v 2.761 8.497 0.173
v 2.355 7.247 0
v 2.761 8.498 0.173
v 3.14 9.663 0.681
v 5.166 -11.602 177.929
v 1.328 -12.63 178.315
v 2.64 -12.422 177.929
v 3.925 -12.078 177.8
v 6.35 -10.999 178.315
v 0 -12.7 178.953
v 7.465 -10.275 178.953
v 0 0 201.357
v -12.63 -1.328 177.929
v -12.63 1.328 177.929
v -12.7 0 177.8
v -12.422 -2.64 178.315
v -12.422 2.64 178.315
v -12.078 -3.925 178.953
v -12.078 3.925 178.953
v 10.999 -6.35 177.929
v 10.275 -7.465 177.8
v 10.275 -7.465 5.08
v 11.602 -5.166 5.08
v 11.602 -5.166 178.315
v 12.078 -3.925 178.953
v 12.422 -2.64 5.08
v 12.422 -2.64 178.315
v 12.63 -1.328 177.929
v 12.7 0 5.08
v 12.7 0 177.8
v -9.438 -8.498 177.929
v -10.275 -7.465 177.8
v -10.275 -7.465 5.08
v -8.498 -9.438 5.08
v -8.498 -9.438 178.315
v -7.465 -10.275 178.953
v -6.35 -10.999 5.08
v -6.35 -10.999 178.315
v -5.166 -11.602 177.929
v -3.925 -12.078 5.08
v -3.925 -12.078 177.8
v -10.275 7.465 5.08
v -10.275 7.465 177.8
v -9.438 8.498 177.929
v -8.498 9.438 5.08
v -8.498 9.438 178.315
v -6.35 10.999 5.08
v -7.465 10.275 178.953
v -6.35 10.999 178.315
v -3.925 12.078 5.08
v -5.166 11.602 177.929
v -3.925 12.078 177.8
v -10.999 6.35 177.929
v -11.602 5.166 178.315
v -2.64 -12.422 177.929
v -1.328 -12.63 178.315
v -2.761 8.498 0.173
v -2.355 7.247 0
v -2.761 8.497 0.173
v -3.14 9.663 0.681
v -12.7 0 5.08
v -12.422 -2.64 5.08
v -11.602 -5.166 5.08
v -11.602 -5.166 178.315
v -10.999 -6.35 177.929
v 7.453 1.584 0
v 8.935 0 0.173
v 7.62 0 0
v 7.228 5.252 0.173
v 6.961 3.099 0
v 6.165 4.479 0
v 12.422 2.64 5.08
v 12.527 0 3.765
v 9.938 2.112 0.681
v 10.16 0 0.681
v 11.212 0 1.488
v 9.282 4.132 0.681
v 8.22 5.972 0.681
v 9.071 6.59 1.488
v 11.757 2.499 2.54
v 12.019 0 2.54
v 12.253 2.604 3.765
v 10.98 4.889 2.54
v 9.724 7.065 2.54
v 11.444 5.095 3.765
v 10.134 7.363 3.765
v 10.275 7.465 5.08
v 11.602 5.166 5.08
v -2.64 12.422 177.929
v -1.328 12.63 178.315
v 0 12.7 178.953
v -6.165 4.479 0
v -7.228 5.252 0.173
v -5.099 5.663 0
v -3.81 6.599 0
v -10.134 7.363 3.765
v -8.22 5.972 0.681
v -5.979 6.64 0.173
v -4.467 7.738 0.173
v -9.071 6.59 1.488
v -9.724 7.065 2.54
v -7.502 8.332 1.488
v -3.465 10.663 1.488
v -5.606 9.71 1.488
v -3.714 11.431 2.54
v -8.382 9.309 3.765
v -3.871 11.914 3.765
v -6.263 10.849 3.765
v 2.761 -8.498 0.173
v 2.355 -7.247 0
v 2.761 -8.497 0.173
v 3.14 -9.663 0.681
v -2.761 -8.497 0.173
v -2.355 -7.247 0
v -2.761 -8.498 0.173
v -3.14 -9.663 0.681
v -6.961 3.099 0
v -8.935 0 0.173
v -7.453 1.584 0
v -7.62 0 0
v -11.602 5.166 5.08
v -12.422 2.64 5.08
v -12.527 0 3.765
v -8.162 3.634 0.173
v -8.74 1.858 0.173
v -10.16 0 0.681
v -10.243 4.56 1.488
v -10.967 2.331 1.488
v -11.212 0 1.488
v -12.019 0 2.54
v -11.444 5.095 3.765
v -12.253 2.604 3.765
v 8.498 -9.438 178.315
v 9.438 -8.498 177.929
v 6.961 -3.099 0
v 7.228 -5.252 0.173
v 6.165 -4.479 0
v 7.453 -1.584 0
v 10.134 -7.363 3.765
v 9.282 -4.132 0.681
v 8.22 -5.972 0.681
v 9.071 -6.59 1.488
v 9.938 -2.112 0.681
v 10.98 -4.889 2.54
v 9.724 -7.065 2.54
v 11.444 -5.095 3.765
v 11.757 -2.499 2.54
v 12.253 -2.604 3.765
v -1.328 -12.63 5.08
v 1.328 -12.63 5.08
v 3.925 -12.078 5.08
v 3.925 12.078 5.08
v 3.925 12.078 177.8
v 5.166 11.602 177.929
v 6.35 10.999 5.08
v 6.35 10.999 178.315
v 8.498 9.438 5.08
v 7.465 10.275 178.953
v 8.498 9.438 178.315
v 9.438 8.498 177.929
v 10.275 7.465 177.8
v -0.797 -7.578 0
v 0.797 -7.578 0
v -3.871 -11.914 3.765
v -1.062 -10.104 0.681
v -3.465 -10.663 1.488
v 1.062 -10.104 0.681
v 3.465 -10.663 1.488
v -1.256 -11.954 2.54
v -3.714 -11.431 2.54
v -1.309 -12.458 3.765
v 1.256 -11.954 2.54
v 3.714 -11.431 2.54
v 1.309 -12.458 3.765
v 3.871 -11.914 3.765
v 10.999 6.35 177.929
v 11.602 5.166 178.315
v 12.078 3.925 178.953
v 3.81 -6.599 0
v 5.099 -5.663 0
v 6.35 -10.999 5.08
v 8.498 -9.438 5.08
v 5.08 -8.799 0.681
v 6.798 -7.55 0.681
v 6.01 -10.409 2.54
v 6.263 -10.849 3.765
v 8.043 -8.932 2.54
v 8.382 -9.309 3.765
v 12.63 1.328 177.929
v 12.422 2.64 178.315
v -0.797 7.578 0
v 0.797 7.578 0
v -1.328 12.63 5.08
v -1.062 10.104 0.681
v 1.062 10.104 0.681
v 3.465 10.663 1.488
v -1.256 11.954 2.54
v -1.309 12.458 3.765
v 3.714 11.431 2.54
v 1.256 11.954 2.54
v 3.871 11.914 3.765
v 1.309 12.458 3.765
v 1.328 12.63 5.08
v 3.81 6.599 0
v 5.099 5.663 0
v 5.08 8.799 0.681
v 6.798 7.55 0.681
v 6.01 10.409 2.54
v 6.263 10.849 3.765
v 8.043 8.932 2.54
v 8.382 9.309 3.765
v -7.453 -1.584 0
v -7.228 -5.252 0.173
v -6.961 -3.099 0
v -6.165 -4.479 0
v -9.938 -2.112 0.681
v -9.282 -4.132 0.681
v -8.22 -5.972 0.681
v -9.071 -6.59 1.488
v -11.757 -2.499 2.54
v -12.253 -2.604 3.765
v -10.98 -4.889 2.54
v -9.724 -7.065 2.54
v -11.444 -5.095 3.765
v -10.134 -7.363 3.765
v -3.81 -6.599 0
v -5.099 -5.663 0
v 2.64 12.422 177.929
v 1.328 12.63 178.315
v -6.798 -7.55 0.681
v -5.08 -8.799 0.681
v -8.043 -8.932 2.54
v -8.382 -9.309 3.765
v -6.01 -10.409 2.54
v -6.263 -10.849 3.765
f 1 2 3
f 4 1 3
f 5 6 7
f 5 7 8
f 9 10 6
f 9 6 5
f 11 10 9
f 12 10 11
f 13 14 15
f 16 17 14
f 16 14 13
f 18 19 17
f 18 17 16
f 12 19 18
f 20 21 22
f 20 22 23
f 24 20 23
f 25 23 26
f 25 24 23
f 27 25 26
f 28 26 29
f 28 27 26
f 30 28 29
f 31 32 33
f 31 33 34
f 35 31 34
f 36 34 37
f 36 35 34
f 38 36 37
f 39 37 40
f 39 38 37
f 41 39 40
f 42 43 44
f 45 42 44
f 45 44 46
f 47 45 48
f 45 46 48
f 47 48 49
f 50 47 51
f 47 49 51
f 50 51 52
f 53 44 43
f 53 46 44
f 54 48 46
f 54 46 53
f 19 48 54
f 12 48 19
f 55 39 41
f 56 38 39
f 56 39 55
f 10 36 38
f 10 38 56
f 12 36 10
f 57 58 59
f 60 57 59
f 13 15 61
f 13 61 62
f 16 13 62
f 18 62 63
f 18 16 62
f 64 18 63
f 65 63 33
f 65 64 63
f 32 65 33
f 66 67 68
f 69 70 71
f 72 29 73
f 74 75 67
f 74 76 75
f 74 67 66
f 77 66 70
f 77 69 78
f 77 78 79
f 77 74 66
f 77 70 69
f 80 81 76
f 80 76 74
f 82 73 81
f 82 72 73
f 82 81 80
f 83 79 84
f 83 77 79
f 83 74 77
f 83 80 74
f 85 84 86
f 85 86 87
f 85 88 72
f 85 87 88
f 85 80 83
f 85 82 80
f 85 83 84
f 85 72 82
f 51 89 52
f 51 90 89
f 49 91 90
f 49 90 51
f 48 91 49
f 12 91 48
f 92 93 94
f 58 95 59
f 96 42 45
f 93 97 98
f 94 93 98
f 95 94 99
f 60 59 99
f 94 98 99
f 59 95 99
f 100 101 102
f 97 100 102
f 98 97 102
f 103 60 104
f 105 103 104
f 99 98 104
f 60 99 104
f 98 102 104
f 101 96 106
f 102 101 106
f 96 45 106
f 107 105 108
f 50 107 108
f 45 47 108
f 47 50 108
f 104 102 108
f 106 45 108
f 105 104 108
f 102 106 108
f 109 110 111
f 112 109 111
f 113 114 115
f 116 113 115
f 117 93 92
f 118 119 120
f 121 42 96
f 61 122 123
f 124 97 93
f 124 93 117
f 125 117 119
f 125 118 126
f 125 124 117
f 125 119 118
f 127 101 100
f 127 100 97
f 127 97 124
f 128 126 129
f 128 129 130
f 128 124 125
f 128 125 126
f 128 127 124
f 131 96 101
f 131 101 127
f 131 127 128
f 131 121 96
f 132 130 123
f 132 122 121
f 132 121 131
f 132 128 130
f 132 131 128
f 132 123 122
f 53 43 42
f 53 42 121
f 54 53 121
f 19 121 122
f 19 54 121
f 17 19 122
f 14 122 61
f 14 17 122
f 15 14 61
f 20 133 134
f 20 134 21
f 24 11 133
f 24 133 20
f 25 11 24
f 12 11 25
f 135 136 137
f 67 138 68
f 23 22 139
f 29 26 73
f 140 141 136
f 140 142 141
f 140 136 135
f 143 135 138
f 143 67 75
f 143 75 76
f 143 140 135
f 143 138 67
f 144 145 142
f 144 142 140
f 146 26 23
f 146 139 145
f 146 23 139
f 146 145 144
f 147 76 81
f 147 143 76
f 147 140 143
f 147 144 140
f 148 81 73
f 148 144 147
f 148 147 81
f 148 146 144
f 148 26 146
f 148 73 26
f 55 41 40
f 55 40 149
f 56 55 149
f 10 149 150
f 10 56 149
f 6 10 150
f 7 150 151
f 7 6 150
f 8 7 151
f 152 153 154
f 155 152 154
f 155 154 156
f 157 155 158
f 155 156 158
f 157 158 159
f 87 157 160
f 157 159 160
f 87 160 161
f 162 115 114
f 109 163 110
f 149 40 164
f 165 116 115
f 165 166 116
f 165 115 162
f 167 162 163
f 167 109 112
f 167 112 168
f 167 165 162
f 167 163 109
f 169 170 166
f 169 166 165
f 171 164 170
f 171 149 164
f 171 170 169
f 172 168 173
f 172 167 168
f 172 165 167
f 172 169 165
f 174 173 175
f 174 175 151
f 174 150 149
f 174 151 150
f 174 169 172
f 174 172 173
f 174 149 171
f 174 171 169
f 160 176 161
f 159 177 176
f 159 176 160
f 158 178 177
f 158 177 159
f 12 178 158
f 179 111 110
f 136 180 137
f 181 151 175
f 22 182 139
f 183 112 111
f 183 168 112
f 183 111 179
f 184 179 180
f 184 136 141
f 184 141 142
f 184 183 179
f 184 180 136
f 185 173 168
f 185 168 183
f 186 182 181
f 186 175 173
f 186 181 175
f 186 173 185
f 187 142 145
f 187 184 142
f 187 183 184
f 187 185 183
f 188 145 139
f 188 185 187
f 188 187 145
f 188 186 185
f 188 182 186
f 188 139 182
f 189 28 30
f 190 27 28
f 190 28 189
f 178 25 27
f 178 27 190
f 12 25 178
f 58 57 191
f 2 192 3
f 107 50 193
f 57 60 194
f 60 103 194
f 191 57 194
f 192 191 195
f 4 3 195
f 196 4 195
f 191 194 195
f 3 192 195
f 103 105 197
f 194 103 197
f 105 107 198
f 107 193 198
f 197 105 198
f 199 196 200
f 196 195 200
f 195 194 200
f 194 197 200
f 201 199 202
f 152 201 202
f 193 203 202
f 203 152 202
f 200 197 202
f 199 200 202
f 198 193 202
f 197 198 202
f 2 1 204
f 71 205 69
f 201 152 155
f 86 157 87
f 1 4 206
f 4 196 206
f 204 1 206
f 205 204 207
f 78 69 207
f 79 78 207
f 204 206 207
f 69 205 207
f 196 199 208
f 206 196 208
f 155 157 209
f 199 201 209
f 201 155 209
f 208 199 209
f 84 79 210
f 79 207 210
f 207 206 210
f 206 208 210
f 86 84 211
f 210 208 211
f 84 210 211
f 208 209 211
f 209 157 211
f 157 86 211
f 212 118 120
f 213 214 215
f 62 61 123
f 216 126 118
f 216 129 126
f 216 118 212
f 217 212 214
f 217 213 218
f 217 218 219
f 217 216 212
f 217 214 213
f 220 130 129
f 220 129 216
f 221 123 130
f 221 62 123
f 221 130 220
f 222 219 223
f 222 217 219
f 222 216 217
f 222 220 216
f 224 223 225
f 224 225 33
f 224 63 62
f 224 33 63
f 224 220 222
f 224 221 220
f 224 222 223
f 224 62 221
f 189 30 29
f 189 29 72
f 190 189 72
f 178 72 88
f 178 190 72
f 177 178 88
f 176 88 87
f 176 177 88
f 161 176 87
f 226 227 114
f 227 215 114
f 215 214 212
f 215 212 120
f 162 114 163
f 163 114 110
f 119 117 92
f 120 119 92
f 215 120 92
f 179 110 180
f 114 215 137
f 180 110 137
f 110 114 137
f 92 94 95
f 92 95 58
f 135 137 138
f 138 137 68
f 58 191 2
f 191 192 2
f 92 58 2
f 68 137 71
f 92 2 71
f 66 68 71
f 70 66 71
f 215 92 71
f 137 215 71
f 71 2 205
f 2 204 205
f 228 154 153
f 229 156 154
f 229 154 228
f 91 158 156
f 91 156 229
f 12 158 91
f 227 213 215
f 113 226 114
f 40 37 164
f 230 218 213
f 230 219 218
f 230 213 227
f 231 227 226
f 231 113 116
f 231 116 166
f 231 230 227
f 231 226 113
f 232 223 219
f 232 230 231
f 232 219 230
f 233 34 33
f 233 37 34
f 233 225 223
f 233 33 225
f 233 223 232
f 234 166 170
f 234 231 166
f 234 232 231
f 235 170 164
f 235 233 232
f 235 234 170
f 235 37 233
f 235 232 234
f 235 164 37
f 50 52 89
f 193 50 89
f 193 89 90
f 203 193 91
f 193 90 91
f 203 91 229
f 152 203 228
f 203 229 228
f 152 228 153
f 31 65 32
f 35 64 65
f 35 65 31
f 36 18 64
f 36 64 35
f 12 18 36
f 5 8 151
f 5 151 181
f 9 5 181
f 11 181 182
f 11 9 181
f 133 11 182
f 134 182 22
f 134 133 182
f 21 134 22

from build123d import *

# Parameters (mm, degrees)
F1_DEPTH     = 177.8
F4_R         = 12.69999
F5_T1_DEPTH  = 6.4984e-06
F5_T3_DEPTH  = 6.4984e-06
F5_T5_DEPTH  = 6.4984e-06
F5_T7_DEPTH  = 6.4984e-06
F5_T9_DEPTH  = 6.4984e-06
F5_T11_DEPTH = 6.4984e-06
F5_T13_DEPTH = 6.4984e-06
F5_T15_DEPTH = 6.4984e-06
F5_T17_DEPTH = 6.4984e-06
F5_T20_ANGLE = 36
F5_T22_ANGLE = 36
F5_T24_ANGLE = 36
F5_T26_ANGLE = 36
F5_T28_ANGLE = 36
F5_T30_ANGLE = 36
F5_T32_ANGLE = 36
F5_T34_ANGLE = 36
F5_T36_ANGLE = 36
F5_T38_ANGLE = 36


# Not quite as in the source:
# - a fillet or chamfer that OpenCascade refuses, or shapes differently, is made with other operations: its cross-section is extruded or revolved along the edge and cut away or added
# - a fillet or chamfer is up to 0.001 mm smaller than in the source, because OpenCascade refuses the exact size


with BuildPart() as f1:
    # F0 (on Top) → F1 (new body)
    with BuildSketch(Plane.XY):
        Polygon((-12.7, 4.1264801422), (-12.7, -4.1264801422), (-7.8490316571, -10.8032652661), (0, -13.3535702478), (7.8490316571, -10.8032652661), (12.7, -4.1264801422), (12.7, 4.1264801422), (7.8490316571, 10.8032652661), (0, 13.3535702478), (-7.8490316571, 10.8032652661), align=None)
    extrude(amount=F1_DEPTH)

    # F1_face (on face) → F3 section 0
    with BuildSketch(Plane.XY.offset(177.8), mode=Mode.PRIVATE) as f3_s0:
        Polygon((-7.8490316571, 10.8032652661), (-12.7, 4.1264801422), (-12.7, -4.1264801422), (-7.8490316571, -10.8032652661), (0, -13.3535702478), (7.8490316571, -10.8032652661), (12.7, -4.1264801422), (12.7, 4.1264801422), (7.8490316571, 10.8032652661), (0, 13.3535702478), align=None)
    loft([f3_s0.sketch, Vertex(0, 0, 201.3573497534)])

    # F4 (radius 12.7 in the source; OpenCascade refuses exactly that, so slightly less here)
    f4_edges = [f1.edges().sort_by_distance(p)[0] for p in [
        (0, -13.35357, 88.9),
        (-7.849032, -10.803265, 88.9),
        (-12.7, -4.12648, 88.9),
        (-12.7, 4.12648, 88.9),
        (-7.849032, 10.803265, 88.9),
        (0, 13.35357, 88.9),
        (7.849032, 10.803265, 88.9),
        (12.7, 4.12648, 88.9),
        (12.7, -4.12648, 88.9),
        (7.849032, -10.803265, 88.9),
    ]]
    fillet(f4_edges, radius=F4_R)

    # F5: fillet of radius 5.08 on 1 edges, made by hand

    # F5_s2 → F5_t1 (cut)
    with BuildSketch(Plane.XZ.offset(-3.2492e-06)):
        with BuildLine():
            ThreePointArc((-7.62, 0), (-11.2121024484, 1.4878975516), (-12.7, 5.08))
            Line((-12.7, 5.08), (-12.7, 0))
            Line((-12.7, 0), (-7.62, 0))
        make_face()
        with BuildLine():
            ThreePointArc((7.62, 0), (11.2121024484, 1.4878975516), (12.7, 5.08))
            Line((12.7, 5.08), (12.7, 0))
            Line((12.7, 0), (7.62, 0))
        make_face()
    extrude(amount=F5_T1_DEPTH, mode=Mode.SUBTRACT)

    # F5_s4 → F5_t3 (cut)
    with BuildSketch(Plane(origin=(-1.9098e-06, 2.6287e-06, 0), x_dir=(0, 0, 1), z_dir=(0.5877852523, -0.8090169944, 0))):
        with BuildLine():
            ThreePointArc((0, 7.62), (1.4878975516, 11.2121024484), (5.08, 12.7))
            Line((5.08, 12.7), (0, 12.7))
            Line((0, 12.7), (0, 7.62))
        make_face()
    extrude(amount=F5_T3_DEPTH, mode=Mode.SUBTRACT)

    # F5_s6 → F5_t5 (cut)
    with BuildSketch(Plane(origin=(-3.0902e-06, 1.0041e-06, 0), x_dir=(0, 0, 1), z_dir=(0.9510565163, -0.3090169944, 0))):
        with BuildLine():
            ThreePointArc((0, 7.62), (1.4878975516, 11.2121024484), (5.08, 12.7))
            Line((5.08, 12.7), (0, 12.7))
            Line((0, 12.7), (0, 7.62))
        make_face()
    extrude(amount=F5_T5_DEPTH, mode=Mode.SUBTRACT)

    # F5_s8 → F5_t7 (cut)
    with BuildSketch(Plane(origin=(-3.0902e-06, -1.0041e-06, 0), x_dir=(0, 0, 1), z_dir=(0.9510565163, 0.3090169944, 0))):
        with BuildLine():
            ThreePointArc((0, 7.62), (1.4878975516, 11.2121024484), (5.08, 12.7))
            Line((5.08, 12.7), (0, 12.7))
            Line((0, 12.7), (0, 7.62))
        make_face()
    extrude(amount=F5_T7_DEPTH, mode=Mode.SUBTRACT)

    # F5_s10 → F5_t9 (cut)
    with BuildSketch(Plane(origin=(-1.9098e-06, -2.6287e-06, 0), x_dir=(0, 0, 1), z_dir=(0.5877852523, 0.8090169944, 0))):
        with BuildLine():
            ThreePointArc((0, 7.62), (1.4878975516, 11.2121024484), (5.08, 12.7))
            Line((5.08, 12.7), (0, 12.7))
            Line((0, 12.7), (0, 7.62))
        make_face()
    extrude(amount=F5_T9_DEPTH, mode=Mode.SUBTRACT)

    # F5_s12 → F5_t11 (cut)
    with BuildSketch(Plane(origin=(1.9098e-06, -2.6287e-06, 0), x_dir=(0, 0, 1), z_dir=(-0.5877852523, 0.8090169944, 0))):
        with BuildLine():
            ThreePointArc((0, 7.62), (1.4878975516, 11.2121024484), (5.08, 12.7))
            Line((5.08, 12.7), (0, 12.7))
            Line((0, 12.7), (0, 7.62))
        make_face()
    extrude(amount=F5_T11_DEPTH, mode=Mode.SUBTRACT)

    # F5_s14 → F5_t13 (cut)
    with BuildSketch(Plane(origin=(3.0902e-06, -1.0041e-06, 0), x_dir=(0, 0, 1), z_dir=(-0.9510565163, 0.3090169944, 0))):
        with BuildLine():
            ThreePointArc((0, 7.62), (1.4878975516, 11.2121024484), (5.08, 12.7))
            Line((5.08, 12.7), (0, 12.7))
            Line((0, 12.7), (0, 7.62))
        make_face()
    extrude(amount=F5_T13_DEPTH, mode=Mode.SUBTRACT)

    # F5_s16 → F5_t15 (cut)
    with BuildSketch(Plane(origin=(3.0902e-06, 1.0041e-06, 0), x_dir=(0, 0, 1), z_dir=(-0.9510565163, -0.3090169944, 0))):
        with BuildLine():
            ThreePointArc((0, 7.62), (1.4878975516, 11.2121024484), (5.08, 12.7))
            Line((5.08, 12.7), (0, 12.7))
            Line((0, 12.7), (0, 7.62))
        make_face()
    extrude(amount=F5_T15_DEPTH, mode=Mode.SUBTRACT)

    # F5_s18 → F5_t17 (cut)
    with BuildSketch(Plane(origin=(1.9098e-06, 2.6287e-06, 0), x_dir=(0, 0, 1), z_dir=(-0.5877852523, -0.8090169944, 0))):
        with BuildLine():
            ThreePointArc((5.08, 12.7), (1.4878975516, 11.2121024484), (0, 7.62))
            Line((0, 7.62), (0, 12.7))
            Line((0, 12.7), (5.08, 12.7))
        make_face()
    extrude(amount=F5_T17_DEPTH, mode=Mode.SUBTRACT)

    # F5_s19 → F5_t20 (revolve, cut)
    with BuildSketch(Plane.XZ.offset(3.2492e-06)):
        with BuildLine():
            ThreePointArc((-7.62, 0), (-11.2121024484, 1.4878975516), (-12.7, 5.08))
            Line((-12.7, 5.08), (-12.7, 0))
            Line((-12.7, 0), (-7.62, 0))
        make_face()
    revolve(axis=Axis((-1e-05, -3.2492e-06, 0), (0, 0, 1)), revolution_arc=F5_T20_ANGLE, mode=Mode.SUBTRACT)

    # F5_s21 → F5_t22 (revolve, cut)
    with BuildSketch(Plane(origin=(1.9098e-06, -2.6287e-06, 0), x_dir=(0, 0, 1), z_dir=(-0.5877852523, 0.8090169944, 0))):
        with BuildLine():
            ThreePointArc((0, -7.62), (1.4878975516, -11.2121024484), (5.08, -12.7))
            Line((5.08, -12.7), (0, -12.7))
            Line((0, -12.7), (0, -7.62))
        make_face()
    revolve(axis=Axis((-6.1803e-06, -8.5065e-06, 0), (0, 0, 1)), revolution_arc=F5_T22_ANGLE, mode=Mode.SUBTRACT)

    # F5_s23 → F5_t24 (revolve, cut)
    with BuildSketch(Plane(origin=(3.0902e-06, -1.0041e-06, 0), x_dir=(0, 0, 1), z_dir=(-0.9510565163, 0.3090169944, 0))):
        with BuildLine():
            ThreePointArc((0, -7.62), (1.4878975516, -11.2121024484), (5.08, -12.7))
            Line((5.08, -12.7), (0, -12.7))
            Line((0, -12.7), (0, -7.62))
        make_face()
    revolve(axis=Axis((0, -1.05146e-05, 0), (0, 0, 1)), revolution_arc=F5_T24_ANGLE, mode=Mode.SUBTRACT)

    # F5_s25 → F5_t26 (revolve, cut)
    with BuildSketch(Plane(origin=(3.0902e-06, 1.0041e-06, 0), x_dir=(0, 0, 1), z_dir=(-0.9510565163, -0.3090169944, 0))):
        with BuildLine():
            ThreePointArc((0, -7.62), (1.4878975516, -11.2121024484), (5.08, -12.7))
            Line((5.08, -12.7), (0, -12.7))
            Line((0, -12.7), (0, -7.62))
        make_face()
    revolve(axis=Axis((6.1803e-06, -8.5065e-06, 0), (0, 0, 1)), revolution_arc=F5_T26_ANGLE, mode=Mode.SUBTRACT)

    # F5_s27 → F5_t28 (revolve, cut)
    with BuildSketch(Plane(origin=(1.9098e-06, 2.6287e-06, 0), x_dir=(0, 0, 1), z_dir=(-0.5877852523, -0.8090169944, 0))):
        with BuildLine():
            ThreePointArc((0, -7.62), (1.4878975516, -11.2121024484), (5.08, -12.7))
            Line((5.08, -12.7), (0, -12.7))
            Line((0, -12.7), (0, -7.62))
        make_face()
    revolve(axis=Axis((1e-05, -3.2492e-06, 0), (0, 0, 1)), revolution_arc=F5_T28_ANGLE, mode=Mode.SUBTRACT)

    # F5_s29 → F5_t30 (revolve, cut)
    with BuildSketch(Plane.XZ.offset(-3.2492e-06)):
        with BuildLine():
            ThreePointArc((7.62, 0), (11.2121024484, 1.4878975516), (12.7, 5.08))
            Line((12.7, 5.08), (12.7, 0))
            Line((12.7, 0), (7.62, 0))
        make_face()
    revolve(axis=Axis((1e-05, 3.2492e-06, 0), (0, 0, 1)), revolution_arc=F5_T30_ANGLE, mode=Mode.SUBTRACT)

    # F5_s31 → F5_t32 (revolve, cut)
    with BuildSketch(Plane(origin=(3.0902e-06, -1.0041e-06, 0), x_dir=(0, 0, 1), z_dir=(-0.9510565163, 0.3090169944, 0))):
        with BuildLine():
            ThreePointArc((0, 7.62), (1.4878975516, 11.2121024484), (5.08, 12.7))
            Line((5.08, 12.7), (0, 12.7))
            Line((0, 12.7), (0, 7.62))
        make_face()
    revolve(axis=Axis((6.1803e-06, 8.5065e-06, 0), (0, 0, -1)), revolution_arc=F5_T32_ANGLE, mode=Mode.SUBTRACT)

    # F5_s33 → F5_t34 (revolve, cut)
    with BuildSketch(Plane(origin=(3.0902e-06, 1.0041e-06, 0), x_dir=(0, 0, 1), z_dir=(-0.9510565163, -0.3090169944, 0))):
        with BuildLine():
            ThreePointArc((0, 7.62), (1.4878975516, 11.2121024484), (5.08, 12.7))
            Line((5.08, 12.7), (0, 12.7))
            Line((0, 12.7), (0, 7.62))
        make_face()
    revolve(axis=Axis((0, 1.05146e-05, 0), (0, 0, -1)), revolution_arc=F5_T34_ANGLE, mode=Mode.SUBTRACT)

    # F5_s35 → F5_t36 (revolve, cut)
    with BuildSketch(Plane(origin=(1.9098e-06, 2.6287e-06, 0), x_dir=(0, 0, 1), z_dir=(-0.5877852523, -0.8090169944, 0))):
        with BuildLine():
            ThreePointArc((0, 7.62), (1.4878975516, 11.2121024484), (5.08, 12.7))
            Line((5.08, 12.7), (0, 12.7))
            Line((0, 12.7), (0, 7.62))
        make_face()
    revolve(axis=Axis((-6.1803e-06, 8.5065e-06, 0), (0, 0, -1)), revolution_arc=F5_T36_ANGLE, mode=Mode.SUBTRACT)

    # F5_s37 → F5_t38 (revolve, cut)
    with BuildSketch(Plane(origin=(-1.9098e-06, -2.6287e-06, 0), x_dir=(0, 0, 1), z_dir=(0.5877852523, 0.8090169944, 0))):
        with BuildLine():
            ThreePointArc((0, -7.62), (1.4878975516, -11.2121024484), (5.08, -12.7))
            Line((5.08, -12.7), (0, -12.7))
            Line((0, -12.7), (0, -7.62))
        make_face()
    revolve(axis=Axis((-1e-05, 3.2492e-06, 0), (0, 0, 1)), revolution_arc=F5_T38_ANGLE, mode=Mode.SUBTRACT)


solid = f1.part
